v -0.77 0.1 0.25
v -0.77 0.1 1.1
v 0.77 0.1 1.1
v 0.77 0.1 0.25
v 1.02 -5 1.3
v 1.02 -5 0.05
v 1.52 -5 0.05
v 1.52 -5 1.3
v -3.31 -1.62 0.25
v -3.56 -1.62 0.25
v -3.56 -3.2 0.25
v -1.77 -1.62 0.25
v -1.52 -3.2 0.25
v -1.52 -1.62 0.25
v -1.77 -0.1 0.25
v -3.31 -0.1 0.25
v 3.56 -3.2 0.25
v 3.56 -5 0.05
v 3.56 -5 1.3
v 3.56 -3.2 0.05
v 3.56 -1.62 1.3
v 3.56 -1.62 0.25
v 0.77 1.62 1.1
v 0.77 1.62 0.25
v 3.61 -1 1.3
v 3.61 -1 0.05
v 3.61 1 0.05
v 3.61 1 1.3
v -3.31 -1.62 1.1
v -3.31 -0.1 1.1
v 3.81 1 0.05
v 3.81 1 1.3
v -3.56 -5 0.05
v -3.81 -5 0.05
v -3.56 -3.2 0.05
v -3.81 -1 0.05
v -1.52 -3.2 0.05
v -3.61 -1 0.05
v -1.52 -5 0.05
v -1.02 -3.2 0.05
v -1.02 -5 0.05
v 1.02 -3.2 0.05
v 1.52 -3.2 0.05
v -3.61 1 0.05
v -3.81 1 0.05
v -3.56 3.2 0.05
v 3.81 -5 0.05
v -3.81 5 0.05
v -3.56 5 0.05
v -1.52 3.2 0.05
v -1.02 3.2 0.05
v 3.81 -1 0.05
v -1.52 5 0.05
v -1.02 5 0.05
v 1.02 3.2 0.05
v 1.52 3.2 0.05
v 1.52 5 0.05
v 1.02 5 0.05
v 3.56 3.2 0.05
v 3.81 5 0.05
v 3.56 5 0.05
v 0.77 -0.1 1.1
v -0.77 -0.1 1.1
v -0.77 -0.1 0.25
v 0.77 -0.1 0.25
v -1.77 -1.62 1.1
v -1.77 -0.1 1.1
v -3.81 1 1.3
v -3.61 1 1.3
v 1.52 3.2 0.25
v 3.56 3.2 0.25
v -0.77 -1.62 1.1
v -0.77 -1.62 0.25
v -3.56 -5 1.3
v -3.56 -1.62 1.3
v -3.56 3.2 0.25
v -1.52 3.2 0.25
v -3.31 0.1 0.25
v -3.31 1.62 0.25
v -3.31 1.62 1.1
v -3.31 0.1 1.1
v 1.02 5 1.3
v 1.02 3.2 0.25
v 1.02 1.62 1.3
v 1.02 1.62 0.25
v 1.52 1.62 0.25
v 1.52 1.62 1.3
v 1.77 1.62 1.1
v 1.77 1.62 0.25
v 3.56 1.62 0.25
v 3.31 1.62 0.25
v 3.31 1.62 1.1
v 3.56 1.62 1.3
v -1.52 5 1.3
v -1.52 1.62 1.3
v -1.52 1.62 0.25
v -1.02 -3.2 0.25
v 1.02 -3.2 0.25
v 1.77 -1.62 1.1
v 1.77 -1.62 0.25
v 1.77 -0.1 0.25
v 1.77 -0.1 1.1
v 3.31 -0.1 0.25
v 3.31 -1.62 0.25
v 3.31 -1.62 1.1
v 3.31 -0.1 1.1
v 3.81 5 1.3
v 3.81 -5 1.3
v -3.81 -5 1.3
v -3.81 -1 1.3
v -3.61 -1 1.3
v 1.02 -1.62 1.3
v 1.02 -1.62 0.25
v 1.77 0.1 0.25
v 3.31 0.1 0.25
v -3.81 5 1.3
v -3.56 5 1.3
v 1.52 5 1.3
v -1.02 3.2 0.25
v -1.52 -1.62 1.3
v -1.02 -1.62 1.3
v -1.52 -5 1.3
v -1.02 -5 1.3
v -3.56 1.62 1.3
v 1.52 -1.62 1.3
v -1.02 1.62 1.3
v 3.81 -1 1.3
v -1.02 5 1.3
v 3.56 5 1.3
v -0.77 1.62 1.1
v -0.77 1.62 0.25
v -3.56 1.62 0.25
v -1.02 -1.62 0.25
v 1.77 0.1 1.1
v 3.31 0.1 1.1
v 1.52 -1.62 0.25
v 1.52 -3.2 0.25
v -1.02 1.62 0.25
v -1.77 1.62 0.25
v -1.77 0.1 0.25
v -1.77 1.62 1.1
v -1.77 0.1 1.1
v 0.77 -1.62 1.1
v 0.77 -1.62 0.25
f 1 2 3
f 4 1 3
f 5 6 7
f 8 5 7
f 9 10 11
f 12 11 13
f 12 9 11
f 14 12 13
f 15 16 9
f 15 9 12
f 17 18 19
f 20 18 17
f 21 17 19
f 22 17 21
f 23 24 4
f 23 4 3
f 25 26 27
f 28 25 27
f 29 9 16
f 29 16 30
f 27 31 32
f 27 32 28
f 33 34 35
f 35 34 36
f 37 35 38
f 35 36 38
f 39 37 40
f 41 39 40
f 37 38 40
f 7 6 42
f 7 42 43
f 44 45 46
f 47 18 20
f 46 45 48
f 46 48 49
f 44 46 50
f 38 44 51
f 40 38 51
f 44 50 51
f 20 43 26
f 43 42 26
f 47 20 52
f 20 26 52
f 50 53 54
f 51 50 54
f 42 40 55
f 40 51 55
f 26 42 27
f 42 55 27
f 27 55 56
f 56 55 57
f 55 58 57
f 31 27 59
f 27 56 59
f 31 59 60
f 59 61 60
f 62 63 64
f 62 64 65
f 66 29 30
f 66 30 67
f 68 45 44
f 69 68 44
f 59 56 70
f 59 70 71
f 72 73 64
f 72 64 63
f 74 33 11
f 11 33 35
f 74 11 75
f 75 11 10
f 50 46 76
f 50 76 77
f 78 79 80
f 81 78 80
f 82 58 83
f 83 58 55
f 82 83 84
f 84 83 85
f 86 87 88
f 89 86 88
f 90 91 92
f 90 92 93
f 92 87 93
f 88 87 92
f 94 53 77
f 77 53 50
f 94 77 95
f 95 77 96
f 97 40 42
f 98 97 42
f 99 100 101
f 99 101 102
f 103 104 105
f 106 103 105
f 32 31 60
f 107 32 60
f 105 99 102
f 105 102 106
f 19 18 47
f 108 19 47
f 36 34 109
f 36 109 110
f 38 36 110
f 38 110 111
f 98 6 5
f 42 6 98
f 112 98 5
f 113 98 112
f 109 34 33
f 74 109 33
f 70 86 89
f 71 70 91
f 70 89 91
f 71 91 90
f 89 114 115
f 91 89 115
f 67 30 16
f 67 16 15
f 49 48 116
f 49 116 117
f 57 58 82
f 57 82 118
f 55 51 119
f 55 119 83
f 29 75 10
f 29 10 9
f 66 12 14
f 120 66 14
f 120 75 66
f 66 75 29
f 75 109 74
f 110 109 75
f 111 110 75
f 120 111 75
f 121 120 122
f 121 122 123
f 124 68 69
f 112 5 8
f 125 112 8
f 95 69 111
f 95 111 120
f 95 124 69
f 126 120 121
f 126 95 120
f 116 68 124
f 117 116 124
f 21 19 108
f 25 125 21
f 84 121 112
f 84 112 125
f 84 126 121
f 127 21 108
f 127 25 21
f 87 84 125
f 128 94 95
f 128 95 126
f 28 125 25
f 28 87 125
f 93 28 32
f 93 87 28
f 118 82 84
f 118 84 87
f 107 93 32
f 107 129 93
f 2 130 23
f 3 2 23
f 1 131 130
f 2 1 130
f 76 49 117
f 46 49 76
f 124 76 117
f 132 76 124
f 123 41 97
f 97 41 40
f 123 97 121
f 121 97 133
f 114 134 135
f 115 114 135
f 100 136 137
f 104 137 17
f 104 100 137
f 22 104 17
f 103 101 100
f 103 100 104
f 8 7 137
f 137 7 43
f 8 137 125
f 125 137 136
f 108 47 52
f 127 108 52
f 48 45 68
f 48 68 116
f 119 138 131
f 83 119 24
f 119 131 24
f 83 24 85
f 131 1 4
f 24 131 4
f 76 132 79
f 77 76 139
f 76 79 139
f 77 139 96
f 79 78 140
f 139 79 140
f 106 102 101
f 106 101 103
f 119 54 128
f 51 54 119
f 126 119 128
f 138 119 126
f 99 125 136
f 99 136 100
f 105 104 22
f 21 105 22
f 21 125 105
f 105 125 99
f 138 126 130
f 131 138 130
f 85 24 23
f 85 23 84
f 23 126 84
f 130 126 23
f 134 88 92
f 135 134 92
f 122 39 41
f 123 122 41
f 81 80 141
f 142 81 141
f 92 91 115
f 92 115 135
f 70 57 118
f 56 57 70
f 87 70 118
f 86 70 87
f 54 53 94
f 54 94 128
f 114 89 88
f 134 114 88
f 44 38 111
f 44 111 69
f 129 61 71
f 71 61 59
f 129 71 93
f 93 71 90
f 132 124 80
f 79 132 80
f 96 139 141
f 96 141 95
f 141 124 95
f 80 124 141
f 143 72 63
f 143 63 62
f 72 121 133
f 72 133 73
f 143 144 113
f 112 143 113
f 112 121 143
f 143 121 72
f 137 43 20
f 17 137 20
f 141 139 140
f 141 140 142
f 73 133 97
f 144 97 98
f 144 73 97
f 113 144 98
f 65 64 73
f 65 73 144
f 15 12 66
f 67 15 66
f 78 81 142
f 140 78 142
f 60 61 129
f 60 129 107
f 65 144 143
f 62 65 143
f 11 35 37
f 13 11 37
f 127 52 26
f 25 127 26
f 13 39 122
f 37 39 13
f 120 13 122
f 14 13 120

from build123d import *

# Parameters (mm, degrees)
SKETCH_W                           = 7.62
SKETCH_H                           = 10
PAD_DEPTH                          = 1.25
SKETCH001_W                        = 2.04
SKETCH001_H                        = 1.8
POCKET_DEPTH                       = 26.519708
SKETCH001_LINEARPATTERN_2_W        = 2.04
SKETCH001_LINEARPATTERN_2_H        = 1.8
POCKET_LINEARPATTERN_2_DEPTH       = 26.519708
SKETCH001_LINEARPATTERN_3_W        = 2.04
SKETCH001_LINEARPATTERN_3_H        = 1.8
POCKET_LINEARPATTERN_3_DEPTH       = 26.519708
SKETCH002_W                        = 2.04
SKETCH002_H                        = 3.38
POCKET001_DEPTH                    = 1.05
SKETCH002_LINEARPATTERN001_2_W     = 2.04
SKETCH002_LINEARPATTERN001_2_H     = 3.38
POCKET001_LINEARPATTERN001_2_DEPTH = 1.05
SKETCH002_LINEARPATTERN001_3_W     = 2.04
SKETCH002_LINEARPATTERN001_3_H     = 3.38
POCKET001_LINEARPATTERN001_3_DEPTH = 1.05
SKETCH003_W                        = 1.54
SKETCH003_H                        = 0.85
POCKET002_DEPTH                    = 4.9
SKETCH003_LINEARPATTERN002_2_W     = 1.54
SKETCH003_LINEARPATTERN002_2_H     = 0.85
POCKET002_LINEARPATTERN002_2_DEPTH = 4.9
SKETCH003_LINEARPATTERN002_3_W     = 1.54
SKETCH003_LINEARPATTERN002_3_H     = 0.85
POCKET002_LINEARPATTERN002_3_DEPTH = 4.9
SKETCH005_W                        = 0.2
SKETCH005_H                        = 2
POCKET003_DEPTH                    = 26.519708


with BuildPart() as part:
    # Sketch → Pad (new body)
    with BuildSketch(Plane.XY):
        Rectangle(SKETCH_W, SKETCH_H)
    extrude(amount=PAD_DEPTH)

    # Sketch001 → Pocket (cut, through all)
    with BuildSketch(Plane.XY):
        with Locations((-2.54, -4.1)):
            Rectangle(SKETCH001_W, SKETCH001_H)
    pocket = extrude(amount=POCKET_DEPTH, mode=Mode.SUBTRACT)

    # Sketch001 LinearPattern 2 → Pocket LinearPattern 2 (cut, through all)
    with BuildSketch(Plane(origin=(2.54, 0, 0), x_dir=(1, 0, 0), z_dir=(0, 0, 1))):
        with Locations((-2.54, -4.1)):
            Rectangle(SKETCH001_LINEARPATTERN_2_W, SKETCH001_LINEARPATTERN_2_H)
    pocket_linearpattern_2 = extrude(amount=POCKET_LINEARPATTERN_2_DEPTH, mode=Mode.SUBTRACT)

    # Sketch001 LinearPattern 3 → Pocket LinearPattern 3 (cut, through all)
    with BuildSketch(Plane(origin=(5.08, 0, 0), x_dir=(1, 0, 0), z_dir=(0, 0, 1))):
        with Locations((-2.54, -4.1)):
            Rectangle(SKETCH001_LINEARPATTERN_3_W, SKETCH001_LINEARPATTERN_3_H)
    pocket_linearpattern_3 = extrude(amount=POCKET_LINEARPATTERN_3_DEPTH, mode=Mode.SUBTRACT)

    # Mirrored: Pocket, Pocket LinearPattern 2, Pocket LinearPattern 3 across Sketch001 H_Axis
    add(pocket.mirror(Plane.ZX), mode=Mode.SUBTRACT)
    add(pocket_linearpattern_2.mirror(Plane.ZX), mode=Mode.SUBTRACT)
    add(pocket_linearpattern_3.mirror(Plane.ZX), mode=Mode.SUBTRACT)

    # Sketch002 → Pocket001 (cut)
    with BuildSketch(Plane.XY.offset(1.25)):
        with Locations((-2.54, -3.31)):
            Rectangle(SKETCH002_W, SKETCH002_H)
    pocket001 = extrude(amount=-POCKET001_DEPTH, mode=Mode.SUBTRACT)

    # Sketch002 LinearPattern001 2 → Pocket001 LinearPattern001 2 (cut)
    with BuildSketch(Plane(origin=(2.54, 0, 1.25), x_dir=(1, 0, 0), z_dir=(0, 0, 1))):
        with Locations((-2.54, -3.31)):
            Rectangle(SKETCH002_LINEARPATTERN001_2_W, SKETCH002_LINEARPATTERN001_2_H)
    pocket001_linearpattern001_2 = extrude(amount=-POCKET001_LINEARPATTERN001_2_DEPTH, mode=Mode.SUBTRACT)

    # Sketch002 LinearPattern001 3 → Pocket001 LinearPattern001 3 (cut)
    with BuildSketch(Plane(origin=(5.08, 0, 1.25), x_dir=(1, 0, 0), z_dir=(0, 0, 1))):
        with Locations((-2.54, -3.31)):
            Rectangle(SKETCH002_LINEARPATTERN001_3_W, SKETCH002_LINEARPATTERN001_3_H)
    pocket001_linearpattern001_3 = extrude(amount=-POCKET001_LINEARPATTERN001_3_DEPTH, mode=Mode.SUBTRACT)

    # Mirrored001: Pocket001, Pocket001 LinearPattern001 2, Pocket001 LinearPattern001 3 across Sketch002 H_Axis
    add(pocket001.mirror(Plane(origin=(0, 0, 1.25), x_dir=(0, 0, 1), z_dir=(0, 1, 0))), mode=Mode.SUBTRACT)
    add(pocket001_linearpattern001_2.mirror(Plane(origin=(0, 0, 1.25), x_dir=(0, 0, 1), z_dir=(0, 1, 0))), mode=Mode.SUBTRACT)
    add(pocket001_linearpattern001_3.mirror(Plane(origin=(0, 0, 1.25), x_dir=(0, 0, 1), z_dir=(0, 1, 0))), mode=Mode.SUBTRACT)

    # Sketch003 → Pocket002 (cut)
    with BuildSketch(Plane.XZ.offset(5)):
        with Locations((-2.54, 0.625)):
            Rectangle(SKETCH003_W, SKETCH003_H)
    pocket002 = extrude(amount=-POCKET002_DEPTH, mode=Mode.SUBTRACT)

    # Sketch003 LinearPattern002 2 → Pocket002 LinearPattern002 2 (cut)
    with BuildSketch(Plane(origin=(2.54, -5, 0), x_dir=(1, 0, 0), z_dir=(0, -1, 0))):
        with Locations((-2.54, 0.625)):
            Rectangle(SKETCH003_LINEARPATTERN002_2_W, SKETCH003_LINEARPATTERN002_2_H)
    pocket002_linearpattern002_2 = extrude(amount=-POCKET002_LINEARPATTERN002_2_DEPTH, mode=Mode.SUBTRACT)

    # Sketch003 LinearPattern002 3 → Pocket002 LinearPattern002 3 (cut)
    with BuildSketch(Plane(origin=(5.08, -5, 0), x_dir=(1, 0, 0), z_dir=(0, -1, 0))):
        with Locations((-2.54, 0.625)):
            Rectangle(SKETCH003_LINEARPATTERN002_3_W, SKETCH003_LINEARPATTERN002_3_H)
    pocket002_linearpattern002_3 = extrude(amount=-POCKET002_LINEARPATTERN002_3_DEPTH, mode=Mode.SUBTRACT)

    # Mirrored002: Pocket002, Pocket002 LinearPattern002 2, Pocket002 LinearPattern002 3 across XZ
    add(pocket002.mirror(Plane.XZ), mode=Mode.SUBTRACT)
    add(pocket002_linearpattern002_2.mirror(Plane.XZ), mode=Mode.SUBTRACT)
    add(pocket002_linearpattern002_3.mirror(Plane.XZ), mode=Mode.SUBTRACT)

    # Sketch005 → Pocket003 (cut, through all)
    with BuildSketch(Plane.XY):
        with Locations((-3.71, 0)):
            Rectangle(SKETCH005_W, SKETCH005_H)
    pocket003 = extrude(amount=POCKET003_DEPTH, mode=Mode.SUBTRACT)

    # Mirrored003: Pocket003 across Sketch005 V_Axis
    add(pocket003.mirror(Plane(origin=(0, 0, 0), x_dir=(0, 0, 1), z_dir=(1, 0, 0))), mode=Mode.SUBTRACT)


with BuildPart() as part_1:
    # Body placement: moved
    add(part.part.moved(Location((0, 0, 0.05))))


solid = part_1.part
